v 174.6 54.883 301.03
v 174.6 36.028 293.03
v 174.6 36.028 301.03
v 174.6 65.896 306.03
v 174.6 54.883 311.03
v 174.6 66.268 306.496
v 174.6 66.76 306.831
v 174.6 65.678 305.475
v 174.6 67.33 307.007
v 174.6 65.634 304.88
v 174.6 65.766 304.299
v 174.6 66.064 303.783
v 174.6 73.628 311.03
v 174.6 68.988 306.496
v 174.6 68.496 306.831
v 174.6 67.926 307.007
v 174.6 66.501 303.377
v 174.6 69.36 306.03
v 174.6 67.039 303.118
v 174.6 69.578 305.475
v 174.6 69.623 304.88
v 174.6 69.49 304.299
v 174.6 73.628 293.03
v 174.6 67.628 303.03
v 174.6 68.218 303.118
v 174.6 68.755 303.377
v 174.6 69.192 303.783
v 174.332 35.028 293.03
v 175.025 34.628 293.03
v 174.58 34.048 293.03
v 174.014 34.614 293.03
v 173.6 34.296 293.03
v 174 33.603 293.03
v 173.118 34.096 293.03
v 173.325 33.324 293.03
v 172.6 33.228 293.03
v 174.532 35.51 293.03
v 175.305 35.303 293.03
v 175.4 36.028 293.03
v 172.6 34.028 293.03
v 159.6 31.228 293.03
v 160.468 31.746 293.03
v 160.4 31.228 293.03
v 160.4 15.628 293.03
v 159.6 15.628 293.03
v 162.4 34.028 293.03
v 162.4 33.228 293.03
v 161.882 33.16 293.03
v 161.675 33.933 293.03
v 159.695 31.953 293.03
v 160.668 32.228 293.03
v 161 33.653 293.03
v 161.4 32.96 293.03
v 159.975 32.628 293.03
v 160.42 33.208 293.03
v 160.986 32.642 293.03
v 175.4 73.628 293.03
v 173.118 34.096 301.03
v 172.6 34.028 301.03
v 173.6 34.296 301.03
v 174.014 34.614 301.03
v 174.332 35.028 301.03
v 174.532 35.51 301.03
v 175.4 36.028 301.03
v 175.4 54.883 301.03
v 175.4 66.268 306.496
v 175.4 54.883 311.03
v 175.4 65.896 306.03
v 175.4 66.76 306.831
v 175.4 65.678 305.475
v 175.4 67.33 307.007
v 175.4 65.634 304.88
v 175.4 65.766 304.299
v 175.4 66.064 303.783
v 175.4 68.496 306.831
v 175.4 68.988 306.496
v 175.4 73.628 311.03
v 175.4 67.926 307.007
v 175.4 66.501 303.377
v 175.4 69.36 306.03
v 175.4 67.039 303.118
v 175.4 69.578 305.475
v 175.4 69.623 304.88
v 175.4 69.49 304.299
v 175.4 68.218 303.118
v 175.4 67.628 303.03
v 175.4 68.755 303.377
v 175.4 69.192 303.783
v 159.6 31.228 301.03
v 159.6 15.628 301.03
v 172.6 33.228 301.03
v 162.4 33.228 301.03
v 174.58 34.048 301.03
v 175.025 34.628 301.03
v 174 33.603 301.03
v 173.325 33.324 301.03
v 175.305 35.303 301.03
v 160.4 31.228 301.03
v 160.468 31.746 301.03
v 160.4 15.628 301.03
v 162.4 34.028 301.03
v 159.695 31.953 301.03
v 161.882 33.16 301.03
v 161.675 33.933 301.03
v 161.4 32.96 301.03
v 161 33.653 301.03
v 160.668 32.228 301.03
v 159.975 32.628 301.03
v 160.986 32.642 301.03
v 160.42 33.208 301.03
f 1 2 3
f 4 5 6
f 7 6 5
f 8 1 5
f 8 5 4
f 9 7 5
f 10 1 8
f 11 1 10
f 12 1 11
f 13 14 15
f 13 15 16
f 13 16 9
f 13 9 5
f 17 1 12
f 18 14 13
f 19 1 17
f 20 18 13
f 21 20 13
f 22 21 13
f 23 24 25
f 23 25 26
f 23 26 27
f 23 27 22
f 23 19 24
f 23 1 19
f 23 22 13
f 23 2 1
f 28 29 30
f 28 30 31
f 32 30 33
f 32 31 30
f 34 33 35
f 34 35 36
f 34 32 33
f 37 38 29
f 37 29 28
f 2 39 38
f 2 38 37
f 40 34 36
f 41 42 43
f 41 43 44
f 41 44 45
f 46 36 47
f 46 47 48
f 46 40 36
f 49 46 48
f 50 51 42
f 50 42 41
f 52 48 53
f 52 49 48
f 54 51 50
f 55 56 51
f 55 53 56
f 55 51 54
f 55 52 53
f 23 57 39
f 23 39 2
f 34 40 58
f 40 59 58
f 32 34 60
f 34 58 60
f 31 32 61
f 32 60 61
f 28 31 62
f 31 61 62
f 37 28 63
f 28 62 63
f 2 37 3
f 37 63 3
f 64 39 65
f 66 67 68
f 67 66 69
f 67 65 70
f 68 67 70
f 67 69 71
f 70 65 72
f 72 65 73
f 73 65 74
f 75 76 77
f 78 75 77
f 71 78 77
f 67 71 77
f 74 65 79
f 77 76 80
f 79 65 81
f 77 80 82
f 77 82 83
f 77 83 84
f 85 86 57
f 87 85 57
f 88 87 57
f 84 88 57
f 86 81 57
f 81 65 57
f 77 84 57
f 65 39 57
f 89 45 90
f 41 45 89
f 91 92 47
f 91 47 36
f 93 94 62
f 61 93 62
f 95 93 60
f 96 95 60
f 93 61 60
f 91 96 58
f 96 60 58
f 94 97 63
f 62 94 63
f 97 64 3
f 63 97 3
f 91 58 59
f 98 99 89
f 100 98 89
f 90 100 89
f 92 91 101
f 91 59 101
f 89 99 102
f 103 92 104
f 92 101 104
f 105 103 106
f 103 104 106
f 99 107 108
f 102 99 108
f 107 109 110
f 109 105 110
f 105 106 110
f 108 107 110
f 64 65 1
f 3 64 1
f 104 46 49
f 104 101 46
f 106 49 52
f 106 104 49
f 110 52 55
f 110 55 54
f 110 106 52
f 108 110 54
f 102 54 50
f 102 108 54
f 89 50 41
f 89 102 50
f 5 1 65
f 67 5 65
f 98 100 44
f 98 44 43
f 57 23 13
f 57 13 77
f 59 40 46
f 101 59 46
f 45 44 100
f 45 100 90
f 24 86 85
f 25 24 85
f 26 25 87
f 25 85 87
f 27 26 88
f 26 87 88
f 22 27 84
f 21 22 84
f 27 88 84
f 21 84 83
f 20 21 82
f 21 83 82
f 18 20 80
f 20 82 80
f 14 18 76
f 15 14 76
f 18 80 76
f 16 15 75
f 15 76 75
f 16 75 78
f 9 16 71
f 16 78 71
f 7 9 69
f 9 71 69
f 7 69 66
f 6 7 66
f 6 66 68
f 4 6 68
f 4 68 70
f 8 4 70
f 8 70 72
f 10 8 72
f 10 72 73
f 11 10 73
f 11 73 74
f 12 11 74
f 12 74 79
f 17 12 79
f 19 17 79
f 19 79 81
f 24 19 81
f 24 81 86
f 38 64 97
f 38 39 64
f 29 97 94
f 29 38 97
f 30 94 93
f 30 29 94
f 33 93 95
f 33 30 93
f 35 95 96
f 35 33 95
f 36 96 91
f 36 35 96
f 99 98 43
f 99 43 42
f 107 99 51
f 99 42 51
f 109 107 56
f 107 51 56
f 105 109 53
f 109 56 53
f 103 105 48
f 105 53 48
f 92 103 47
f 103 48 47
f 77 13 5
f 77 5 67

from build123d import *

# Parameters (mm, degrees)
SKETCH1_W           = 15.8
SKETCH1_H           = 58
BOSS_EXTRUDE1_DEPTH = 8
SKETCH2_W           = 15
SKETCH2_H           = 39.6
CUT_EXTRUDE1_DEPTH  = 191.395014145
SKETCH3_W           = 0.8
SKETCH3_H           = 18.745212198
BOSS_EXTRUDE2_DEPTH = 10
SKETCH4_W           = 15
SKETCH4_H           = 17.6
CUT_EXTRUDE2_DEPTH  = 191.489530975
HOLE1_D             = 4
FILLET1_R           = 2
FILLET2_R           = 2
FILLET3_R           = 2.8
FILLET4_R           = 2.8


with BuildPart() as part:
    # Sketch1 → Boss-Extrude1 (new body)
    with BuildSketch(Plane(origin=(0, 0, 293.029524909), x_dir=(-1, 0, 0), z_dir=(0, 0, -1))):
        with Locations((-167.5, 44.628129211)):
            Rectangle(SKETCH1_W, SKETCH1_H)
    extrude(amount=-BOSS_EXTRUDE1_DEPTH)

    # Sketch2 → Cut-Extrude1 (cut, through all)
    with BuildSketch(Plane(origin=(0, 0, 293.029524909), x_dir=(-1, 0, 0), z_dir=(0, 0, -1))):
        with Locations((-167.1, 53.828129211)):
            Rectangle(SKETCH2_W, SKETCH2_H)
    extrude(amount=-CUT_EXTRUDE1_DEPTH, mode=Mode.SUBTRACT)

    # Sketch3 → Boss-Extrude2 (add)
    with BuildSketch(Plane.XY.offset(301.029524909)):
        with Locations((175, 64.255523112)):
            Rectangle(SKETCH3_W, SKETCH3_H)
    extrude(amount=BOSS_EXTRUDE2_DEPTH)

    # Sketch4 → Cut-Extrude2 (cut, through all)
    with BuildSketch(Plane.XY.offset(301.029524909)):
        with Locations((167.9, 24.428129211)):
            Rectangle(SKETCH4_W, SKETCH4_H)
    extrude(amount=-CUT_EXTRUDE2_DEPTH, mode=Mode.SUBTRACT)

    # Hole1 (through all)
    with Locations(Plane.ZY.offset(-174.6)):
        with Locations((305.029524909, 67.628129211)):
            Hole(HOLE1_D / 2)

    # Fillet1
    fillet1_edges = [part.edges().sort_by_distance(p)[0] for p in [
        (160.4, 33.228129211, 297.029524909),
    ]]
    fillet(fillet1_edges, radius=FILLET1_R)

    # Fillet2
    fillet2_edges = [part.edges().sort_by_distance(p)[0] for p in [
        (174.6, 34.028129211, 297.029524909),
    ]]
    fillet(fillet2_edges, radius=FILLET2_R)

    # Fillet3
    fillet3_edges = [part.edges().sort_by_distance(p)[0] for p in [
        (159.6, 34.028129211, 297.029524909),
    ]]
    fillet(fillet3_edges, radius=FILLET3_R)

    # Fillet4
    fillet4_edges = [part.edges().sort_by_distance(p)[0] for p in [
        (175.4, 33.228129211, 297.029524909),
    ]]
    fillet(fillet4_edges, radius=FILLET4_R)


solid = part.part
